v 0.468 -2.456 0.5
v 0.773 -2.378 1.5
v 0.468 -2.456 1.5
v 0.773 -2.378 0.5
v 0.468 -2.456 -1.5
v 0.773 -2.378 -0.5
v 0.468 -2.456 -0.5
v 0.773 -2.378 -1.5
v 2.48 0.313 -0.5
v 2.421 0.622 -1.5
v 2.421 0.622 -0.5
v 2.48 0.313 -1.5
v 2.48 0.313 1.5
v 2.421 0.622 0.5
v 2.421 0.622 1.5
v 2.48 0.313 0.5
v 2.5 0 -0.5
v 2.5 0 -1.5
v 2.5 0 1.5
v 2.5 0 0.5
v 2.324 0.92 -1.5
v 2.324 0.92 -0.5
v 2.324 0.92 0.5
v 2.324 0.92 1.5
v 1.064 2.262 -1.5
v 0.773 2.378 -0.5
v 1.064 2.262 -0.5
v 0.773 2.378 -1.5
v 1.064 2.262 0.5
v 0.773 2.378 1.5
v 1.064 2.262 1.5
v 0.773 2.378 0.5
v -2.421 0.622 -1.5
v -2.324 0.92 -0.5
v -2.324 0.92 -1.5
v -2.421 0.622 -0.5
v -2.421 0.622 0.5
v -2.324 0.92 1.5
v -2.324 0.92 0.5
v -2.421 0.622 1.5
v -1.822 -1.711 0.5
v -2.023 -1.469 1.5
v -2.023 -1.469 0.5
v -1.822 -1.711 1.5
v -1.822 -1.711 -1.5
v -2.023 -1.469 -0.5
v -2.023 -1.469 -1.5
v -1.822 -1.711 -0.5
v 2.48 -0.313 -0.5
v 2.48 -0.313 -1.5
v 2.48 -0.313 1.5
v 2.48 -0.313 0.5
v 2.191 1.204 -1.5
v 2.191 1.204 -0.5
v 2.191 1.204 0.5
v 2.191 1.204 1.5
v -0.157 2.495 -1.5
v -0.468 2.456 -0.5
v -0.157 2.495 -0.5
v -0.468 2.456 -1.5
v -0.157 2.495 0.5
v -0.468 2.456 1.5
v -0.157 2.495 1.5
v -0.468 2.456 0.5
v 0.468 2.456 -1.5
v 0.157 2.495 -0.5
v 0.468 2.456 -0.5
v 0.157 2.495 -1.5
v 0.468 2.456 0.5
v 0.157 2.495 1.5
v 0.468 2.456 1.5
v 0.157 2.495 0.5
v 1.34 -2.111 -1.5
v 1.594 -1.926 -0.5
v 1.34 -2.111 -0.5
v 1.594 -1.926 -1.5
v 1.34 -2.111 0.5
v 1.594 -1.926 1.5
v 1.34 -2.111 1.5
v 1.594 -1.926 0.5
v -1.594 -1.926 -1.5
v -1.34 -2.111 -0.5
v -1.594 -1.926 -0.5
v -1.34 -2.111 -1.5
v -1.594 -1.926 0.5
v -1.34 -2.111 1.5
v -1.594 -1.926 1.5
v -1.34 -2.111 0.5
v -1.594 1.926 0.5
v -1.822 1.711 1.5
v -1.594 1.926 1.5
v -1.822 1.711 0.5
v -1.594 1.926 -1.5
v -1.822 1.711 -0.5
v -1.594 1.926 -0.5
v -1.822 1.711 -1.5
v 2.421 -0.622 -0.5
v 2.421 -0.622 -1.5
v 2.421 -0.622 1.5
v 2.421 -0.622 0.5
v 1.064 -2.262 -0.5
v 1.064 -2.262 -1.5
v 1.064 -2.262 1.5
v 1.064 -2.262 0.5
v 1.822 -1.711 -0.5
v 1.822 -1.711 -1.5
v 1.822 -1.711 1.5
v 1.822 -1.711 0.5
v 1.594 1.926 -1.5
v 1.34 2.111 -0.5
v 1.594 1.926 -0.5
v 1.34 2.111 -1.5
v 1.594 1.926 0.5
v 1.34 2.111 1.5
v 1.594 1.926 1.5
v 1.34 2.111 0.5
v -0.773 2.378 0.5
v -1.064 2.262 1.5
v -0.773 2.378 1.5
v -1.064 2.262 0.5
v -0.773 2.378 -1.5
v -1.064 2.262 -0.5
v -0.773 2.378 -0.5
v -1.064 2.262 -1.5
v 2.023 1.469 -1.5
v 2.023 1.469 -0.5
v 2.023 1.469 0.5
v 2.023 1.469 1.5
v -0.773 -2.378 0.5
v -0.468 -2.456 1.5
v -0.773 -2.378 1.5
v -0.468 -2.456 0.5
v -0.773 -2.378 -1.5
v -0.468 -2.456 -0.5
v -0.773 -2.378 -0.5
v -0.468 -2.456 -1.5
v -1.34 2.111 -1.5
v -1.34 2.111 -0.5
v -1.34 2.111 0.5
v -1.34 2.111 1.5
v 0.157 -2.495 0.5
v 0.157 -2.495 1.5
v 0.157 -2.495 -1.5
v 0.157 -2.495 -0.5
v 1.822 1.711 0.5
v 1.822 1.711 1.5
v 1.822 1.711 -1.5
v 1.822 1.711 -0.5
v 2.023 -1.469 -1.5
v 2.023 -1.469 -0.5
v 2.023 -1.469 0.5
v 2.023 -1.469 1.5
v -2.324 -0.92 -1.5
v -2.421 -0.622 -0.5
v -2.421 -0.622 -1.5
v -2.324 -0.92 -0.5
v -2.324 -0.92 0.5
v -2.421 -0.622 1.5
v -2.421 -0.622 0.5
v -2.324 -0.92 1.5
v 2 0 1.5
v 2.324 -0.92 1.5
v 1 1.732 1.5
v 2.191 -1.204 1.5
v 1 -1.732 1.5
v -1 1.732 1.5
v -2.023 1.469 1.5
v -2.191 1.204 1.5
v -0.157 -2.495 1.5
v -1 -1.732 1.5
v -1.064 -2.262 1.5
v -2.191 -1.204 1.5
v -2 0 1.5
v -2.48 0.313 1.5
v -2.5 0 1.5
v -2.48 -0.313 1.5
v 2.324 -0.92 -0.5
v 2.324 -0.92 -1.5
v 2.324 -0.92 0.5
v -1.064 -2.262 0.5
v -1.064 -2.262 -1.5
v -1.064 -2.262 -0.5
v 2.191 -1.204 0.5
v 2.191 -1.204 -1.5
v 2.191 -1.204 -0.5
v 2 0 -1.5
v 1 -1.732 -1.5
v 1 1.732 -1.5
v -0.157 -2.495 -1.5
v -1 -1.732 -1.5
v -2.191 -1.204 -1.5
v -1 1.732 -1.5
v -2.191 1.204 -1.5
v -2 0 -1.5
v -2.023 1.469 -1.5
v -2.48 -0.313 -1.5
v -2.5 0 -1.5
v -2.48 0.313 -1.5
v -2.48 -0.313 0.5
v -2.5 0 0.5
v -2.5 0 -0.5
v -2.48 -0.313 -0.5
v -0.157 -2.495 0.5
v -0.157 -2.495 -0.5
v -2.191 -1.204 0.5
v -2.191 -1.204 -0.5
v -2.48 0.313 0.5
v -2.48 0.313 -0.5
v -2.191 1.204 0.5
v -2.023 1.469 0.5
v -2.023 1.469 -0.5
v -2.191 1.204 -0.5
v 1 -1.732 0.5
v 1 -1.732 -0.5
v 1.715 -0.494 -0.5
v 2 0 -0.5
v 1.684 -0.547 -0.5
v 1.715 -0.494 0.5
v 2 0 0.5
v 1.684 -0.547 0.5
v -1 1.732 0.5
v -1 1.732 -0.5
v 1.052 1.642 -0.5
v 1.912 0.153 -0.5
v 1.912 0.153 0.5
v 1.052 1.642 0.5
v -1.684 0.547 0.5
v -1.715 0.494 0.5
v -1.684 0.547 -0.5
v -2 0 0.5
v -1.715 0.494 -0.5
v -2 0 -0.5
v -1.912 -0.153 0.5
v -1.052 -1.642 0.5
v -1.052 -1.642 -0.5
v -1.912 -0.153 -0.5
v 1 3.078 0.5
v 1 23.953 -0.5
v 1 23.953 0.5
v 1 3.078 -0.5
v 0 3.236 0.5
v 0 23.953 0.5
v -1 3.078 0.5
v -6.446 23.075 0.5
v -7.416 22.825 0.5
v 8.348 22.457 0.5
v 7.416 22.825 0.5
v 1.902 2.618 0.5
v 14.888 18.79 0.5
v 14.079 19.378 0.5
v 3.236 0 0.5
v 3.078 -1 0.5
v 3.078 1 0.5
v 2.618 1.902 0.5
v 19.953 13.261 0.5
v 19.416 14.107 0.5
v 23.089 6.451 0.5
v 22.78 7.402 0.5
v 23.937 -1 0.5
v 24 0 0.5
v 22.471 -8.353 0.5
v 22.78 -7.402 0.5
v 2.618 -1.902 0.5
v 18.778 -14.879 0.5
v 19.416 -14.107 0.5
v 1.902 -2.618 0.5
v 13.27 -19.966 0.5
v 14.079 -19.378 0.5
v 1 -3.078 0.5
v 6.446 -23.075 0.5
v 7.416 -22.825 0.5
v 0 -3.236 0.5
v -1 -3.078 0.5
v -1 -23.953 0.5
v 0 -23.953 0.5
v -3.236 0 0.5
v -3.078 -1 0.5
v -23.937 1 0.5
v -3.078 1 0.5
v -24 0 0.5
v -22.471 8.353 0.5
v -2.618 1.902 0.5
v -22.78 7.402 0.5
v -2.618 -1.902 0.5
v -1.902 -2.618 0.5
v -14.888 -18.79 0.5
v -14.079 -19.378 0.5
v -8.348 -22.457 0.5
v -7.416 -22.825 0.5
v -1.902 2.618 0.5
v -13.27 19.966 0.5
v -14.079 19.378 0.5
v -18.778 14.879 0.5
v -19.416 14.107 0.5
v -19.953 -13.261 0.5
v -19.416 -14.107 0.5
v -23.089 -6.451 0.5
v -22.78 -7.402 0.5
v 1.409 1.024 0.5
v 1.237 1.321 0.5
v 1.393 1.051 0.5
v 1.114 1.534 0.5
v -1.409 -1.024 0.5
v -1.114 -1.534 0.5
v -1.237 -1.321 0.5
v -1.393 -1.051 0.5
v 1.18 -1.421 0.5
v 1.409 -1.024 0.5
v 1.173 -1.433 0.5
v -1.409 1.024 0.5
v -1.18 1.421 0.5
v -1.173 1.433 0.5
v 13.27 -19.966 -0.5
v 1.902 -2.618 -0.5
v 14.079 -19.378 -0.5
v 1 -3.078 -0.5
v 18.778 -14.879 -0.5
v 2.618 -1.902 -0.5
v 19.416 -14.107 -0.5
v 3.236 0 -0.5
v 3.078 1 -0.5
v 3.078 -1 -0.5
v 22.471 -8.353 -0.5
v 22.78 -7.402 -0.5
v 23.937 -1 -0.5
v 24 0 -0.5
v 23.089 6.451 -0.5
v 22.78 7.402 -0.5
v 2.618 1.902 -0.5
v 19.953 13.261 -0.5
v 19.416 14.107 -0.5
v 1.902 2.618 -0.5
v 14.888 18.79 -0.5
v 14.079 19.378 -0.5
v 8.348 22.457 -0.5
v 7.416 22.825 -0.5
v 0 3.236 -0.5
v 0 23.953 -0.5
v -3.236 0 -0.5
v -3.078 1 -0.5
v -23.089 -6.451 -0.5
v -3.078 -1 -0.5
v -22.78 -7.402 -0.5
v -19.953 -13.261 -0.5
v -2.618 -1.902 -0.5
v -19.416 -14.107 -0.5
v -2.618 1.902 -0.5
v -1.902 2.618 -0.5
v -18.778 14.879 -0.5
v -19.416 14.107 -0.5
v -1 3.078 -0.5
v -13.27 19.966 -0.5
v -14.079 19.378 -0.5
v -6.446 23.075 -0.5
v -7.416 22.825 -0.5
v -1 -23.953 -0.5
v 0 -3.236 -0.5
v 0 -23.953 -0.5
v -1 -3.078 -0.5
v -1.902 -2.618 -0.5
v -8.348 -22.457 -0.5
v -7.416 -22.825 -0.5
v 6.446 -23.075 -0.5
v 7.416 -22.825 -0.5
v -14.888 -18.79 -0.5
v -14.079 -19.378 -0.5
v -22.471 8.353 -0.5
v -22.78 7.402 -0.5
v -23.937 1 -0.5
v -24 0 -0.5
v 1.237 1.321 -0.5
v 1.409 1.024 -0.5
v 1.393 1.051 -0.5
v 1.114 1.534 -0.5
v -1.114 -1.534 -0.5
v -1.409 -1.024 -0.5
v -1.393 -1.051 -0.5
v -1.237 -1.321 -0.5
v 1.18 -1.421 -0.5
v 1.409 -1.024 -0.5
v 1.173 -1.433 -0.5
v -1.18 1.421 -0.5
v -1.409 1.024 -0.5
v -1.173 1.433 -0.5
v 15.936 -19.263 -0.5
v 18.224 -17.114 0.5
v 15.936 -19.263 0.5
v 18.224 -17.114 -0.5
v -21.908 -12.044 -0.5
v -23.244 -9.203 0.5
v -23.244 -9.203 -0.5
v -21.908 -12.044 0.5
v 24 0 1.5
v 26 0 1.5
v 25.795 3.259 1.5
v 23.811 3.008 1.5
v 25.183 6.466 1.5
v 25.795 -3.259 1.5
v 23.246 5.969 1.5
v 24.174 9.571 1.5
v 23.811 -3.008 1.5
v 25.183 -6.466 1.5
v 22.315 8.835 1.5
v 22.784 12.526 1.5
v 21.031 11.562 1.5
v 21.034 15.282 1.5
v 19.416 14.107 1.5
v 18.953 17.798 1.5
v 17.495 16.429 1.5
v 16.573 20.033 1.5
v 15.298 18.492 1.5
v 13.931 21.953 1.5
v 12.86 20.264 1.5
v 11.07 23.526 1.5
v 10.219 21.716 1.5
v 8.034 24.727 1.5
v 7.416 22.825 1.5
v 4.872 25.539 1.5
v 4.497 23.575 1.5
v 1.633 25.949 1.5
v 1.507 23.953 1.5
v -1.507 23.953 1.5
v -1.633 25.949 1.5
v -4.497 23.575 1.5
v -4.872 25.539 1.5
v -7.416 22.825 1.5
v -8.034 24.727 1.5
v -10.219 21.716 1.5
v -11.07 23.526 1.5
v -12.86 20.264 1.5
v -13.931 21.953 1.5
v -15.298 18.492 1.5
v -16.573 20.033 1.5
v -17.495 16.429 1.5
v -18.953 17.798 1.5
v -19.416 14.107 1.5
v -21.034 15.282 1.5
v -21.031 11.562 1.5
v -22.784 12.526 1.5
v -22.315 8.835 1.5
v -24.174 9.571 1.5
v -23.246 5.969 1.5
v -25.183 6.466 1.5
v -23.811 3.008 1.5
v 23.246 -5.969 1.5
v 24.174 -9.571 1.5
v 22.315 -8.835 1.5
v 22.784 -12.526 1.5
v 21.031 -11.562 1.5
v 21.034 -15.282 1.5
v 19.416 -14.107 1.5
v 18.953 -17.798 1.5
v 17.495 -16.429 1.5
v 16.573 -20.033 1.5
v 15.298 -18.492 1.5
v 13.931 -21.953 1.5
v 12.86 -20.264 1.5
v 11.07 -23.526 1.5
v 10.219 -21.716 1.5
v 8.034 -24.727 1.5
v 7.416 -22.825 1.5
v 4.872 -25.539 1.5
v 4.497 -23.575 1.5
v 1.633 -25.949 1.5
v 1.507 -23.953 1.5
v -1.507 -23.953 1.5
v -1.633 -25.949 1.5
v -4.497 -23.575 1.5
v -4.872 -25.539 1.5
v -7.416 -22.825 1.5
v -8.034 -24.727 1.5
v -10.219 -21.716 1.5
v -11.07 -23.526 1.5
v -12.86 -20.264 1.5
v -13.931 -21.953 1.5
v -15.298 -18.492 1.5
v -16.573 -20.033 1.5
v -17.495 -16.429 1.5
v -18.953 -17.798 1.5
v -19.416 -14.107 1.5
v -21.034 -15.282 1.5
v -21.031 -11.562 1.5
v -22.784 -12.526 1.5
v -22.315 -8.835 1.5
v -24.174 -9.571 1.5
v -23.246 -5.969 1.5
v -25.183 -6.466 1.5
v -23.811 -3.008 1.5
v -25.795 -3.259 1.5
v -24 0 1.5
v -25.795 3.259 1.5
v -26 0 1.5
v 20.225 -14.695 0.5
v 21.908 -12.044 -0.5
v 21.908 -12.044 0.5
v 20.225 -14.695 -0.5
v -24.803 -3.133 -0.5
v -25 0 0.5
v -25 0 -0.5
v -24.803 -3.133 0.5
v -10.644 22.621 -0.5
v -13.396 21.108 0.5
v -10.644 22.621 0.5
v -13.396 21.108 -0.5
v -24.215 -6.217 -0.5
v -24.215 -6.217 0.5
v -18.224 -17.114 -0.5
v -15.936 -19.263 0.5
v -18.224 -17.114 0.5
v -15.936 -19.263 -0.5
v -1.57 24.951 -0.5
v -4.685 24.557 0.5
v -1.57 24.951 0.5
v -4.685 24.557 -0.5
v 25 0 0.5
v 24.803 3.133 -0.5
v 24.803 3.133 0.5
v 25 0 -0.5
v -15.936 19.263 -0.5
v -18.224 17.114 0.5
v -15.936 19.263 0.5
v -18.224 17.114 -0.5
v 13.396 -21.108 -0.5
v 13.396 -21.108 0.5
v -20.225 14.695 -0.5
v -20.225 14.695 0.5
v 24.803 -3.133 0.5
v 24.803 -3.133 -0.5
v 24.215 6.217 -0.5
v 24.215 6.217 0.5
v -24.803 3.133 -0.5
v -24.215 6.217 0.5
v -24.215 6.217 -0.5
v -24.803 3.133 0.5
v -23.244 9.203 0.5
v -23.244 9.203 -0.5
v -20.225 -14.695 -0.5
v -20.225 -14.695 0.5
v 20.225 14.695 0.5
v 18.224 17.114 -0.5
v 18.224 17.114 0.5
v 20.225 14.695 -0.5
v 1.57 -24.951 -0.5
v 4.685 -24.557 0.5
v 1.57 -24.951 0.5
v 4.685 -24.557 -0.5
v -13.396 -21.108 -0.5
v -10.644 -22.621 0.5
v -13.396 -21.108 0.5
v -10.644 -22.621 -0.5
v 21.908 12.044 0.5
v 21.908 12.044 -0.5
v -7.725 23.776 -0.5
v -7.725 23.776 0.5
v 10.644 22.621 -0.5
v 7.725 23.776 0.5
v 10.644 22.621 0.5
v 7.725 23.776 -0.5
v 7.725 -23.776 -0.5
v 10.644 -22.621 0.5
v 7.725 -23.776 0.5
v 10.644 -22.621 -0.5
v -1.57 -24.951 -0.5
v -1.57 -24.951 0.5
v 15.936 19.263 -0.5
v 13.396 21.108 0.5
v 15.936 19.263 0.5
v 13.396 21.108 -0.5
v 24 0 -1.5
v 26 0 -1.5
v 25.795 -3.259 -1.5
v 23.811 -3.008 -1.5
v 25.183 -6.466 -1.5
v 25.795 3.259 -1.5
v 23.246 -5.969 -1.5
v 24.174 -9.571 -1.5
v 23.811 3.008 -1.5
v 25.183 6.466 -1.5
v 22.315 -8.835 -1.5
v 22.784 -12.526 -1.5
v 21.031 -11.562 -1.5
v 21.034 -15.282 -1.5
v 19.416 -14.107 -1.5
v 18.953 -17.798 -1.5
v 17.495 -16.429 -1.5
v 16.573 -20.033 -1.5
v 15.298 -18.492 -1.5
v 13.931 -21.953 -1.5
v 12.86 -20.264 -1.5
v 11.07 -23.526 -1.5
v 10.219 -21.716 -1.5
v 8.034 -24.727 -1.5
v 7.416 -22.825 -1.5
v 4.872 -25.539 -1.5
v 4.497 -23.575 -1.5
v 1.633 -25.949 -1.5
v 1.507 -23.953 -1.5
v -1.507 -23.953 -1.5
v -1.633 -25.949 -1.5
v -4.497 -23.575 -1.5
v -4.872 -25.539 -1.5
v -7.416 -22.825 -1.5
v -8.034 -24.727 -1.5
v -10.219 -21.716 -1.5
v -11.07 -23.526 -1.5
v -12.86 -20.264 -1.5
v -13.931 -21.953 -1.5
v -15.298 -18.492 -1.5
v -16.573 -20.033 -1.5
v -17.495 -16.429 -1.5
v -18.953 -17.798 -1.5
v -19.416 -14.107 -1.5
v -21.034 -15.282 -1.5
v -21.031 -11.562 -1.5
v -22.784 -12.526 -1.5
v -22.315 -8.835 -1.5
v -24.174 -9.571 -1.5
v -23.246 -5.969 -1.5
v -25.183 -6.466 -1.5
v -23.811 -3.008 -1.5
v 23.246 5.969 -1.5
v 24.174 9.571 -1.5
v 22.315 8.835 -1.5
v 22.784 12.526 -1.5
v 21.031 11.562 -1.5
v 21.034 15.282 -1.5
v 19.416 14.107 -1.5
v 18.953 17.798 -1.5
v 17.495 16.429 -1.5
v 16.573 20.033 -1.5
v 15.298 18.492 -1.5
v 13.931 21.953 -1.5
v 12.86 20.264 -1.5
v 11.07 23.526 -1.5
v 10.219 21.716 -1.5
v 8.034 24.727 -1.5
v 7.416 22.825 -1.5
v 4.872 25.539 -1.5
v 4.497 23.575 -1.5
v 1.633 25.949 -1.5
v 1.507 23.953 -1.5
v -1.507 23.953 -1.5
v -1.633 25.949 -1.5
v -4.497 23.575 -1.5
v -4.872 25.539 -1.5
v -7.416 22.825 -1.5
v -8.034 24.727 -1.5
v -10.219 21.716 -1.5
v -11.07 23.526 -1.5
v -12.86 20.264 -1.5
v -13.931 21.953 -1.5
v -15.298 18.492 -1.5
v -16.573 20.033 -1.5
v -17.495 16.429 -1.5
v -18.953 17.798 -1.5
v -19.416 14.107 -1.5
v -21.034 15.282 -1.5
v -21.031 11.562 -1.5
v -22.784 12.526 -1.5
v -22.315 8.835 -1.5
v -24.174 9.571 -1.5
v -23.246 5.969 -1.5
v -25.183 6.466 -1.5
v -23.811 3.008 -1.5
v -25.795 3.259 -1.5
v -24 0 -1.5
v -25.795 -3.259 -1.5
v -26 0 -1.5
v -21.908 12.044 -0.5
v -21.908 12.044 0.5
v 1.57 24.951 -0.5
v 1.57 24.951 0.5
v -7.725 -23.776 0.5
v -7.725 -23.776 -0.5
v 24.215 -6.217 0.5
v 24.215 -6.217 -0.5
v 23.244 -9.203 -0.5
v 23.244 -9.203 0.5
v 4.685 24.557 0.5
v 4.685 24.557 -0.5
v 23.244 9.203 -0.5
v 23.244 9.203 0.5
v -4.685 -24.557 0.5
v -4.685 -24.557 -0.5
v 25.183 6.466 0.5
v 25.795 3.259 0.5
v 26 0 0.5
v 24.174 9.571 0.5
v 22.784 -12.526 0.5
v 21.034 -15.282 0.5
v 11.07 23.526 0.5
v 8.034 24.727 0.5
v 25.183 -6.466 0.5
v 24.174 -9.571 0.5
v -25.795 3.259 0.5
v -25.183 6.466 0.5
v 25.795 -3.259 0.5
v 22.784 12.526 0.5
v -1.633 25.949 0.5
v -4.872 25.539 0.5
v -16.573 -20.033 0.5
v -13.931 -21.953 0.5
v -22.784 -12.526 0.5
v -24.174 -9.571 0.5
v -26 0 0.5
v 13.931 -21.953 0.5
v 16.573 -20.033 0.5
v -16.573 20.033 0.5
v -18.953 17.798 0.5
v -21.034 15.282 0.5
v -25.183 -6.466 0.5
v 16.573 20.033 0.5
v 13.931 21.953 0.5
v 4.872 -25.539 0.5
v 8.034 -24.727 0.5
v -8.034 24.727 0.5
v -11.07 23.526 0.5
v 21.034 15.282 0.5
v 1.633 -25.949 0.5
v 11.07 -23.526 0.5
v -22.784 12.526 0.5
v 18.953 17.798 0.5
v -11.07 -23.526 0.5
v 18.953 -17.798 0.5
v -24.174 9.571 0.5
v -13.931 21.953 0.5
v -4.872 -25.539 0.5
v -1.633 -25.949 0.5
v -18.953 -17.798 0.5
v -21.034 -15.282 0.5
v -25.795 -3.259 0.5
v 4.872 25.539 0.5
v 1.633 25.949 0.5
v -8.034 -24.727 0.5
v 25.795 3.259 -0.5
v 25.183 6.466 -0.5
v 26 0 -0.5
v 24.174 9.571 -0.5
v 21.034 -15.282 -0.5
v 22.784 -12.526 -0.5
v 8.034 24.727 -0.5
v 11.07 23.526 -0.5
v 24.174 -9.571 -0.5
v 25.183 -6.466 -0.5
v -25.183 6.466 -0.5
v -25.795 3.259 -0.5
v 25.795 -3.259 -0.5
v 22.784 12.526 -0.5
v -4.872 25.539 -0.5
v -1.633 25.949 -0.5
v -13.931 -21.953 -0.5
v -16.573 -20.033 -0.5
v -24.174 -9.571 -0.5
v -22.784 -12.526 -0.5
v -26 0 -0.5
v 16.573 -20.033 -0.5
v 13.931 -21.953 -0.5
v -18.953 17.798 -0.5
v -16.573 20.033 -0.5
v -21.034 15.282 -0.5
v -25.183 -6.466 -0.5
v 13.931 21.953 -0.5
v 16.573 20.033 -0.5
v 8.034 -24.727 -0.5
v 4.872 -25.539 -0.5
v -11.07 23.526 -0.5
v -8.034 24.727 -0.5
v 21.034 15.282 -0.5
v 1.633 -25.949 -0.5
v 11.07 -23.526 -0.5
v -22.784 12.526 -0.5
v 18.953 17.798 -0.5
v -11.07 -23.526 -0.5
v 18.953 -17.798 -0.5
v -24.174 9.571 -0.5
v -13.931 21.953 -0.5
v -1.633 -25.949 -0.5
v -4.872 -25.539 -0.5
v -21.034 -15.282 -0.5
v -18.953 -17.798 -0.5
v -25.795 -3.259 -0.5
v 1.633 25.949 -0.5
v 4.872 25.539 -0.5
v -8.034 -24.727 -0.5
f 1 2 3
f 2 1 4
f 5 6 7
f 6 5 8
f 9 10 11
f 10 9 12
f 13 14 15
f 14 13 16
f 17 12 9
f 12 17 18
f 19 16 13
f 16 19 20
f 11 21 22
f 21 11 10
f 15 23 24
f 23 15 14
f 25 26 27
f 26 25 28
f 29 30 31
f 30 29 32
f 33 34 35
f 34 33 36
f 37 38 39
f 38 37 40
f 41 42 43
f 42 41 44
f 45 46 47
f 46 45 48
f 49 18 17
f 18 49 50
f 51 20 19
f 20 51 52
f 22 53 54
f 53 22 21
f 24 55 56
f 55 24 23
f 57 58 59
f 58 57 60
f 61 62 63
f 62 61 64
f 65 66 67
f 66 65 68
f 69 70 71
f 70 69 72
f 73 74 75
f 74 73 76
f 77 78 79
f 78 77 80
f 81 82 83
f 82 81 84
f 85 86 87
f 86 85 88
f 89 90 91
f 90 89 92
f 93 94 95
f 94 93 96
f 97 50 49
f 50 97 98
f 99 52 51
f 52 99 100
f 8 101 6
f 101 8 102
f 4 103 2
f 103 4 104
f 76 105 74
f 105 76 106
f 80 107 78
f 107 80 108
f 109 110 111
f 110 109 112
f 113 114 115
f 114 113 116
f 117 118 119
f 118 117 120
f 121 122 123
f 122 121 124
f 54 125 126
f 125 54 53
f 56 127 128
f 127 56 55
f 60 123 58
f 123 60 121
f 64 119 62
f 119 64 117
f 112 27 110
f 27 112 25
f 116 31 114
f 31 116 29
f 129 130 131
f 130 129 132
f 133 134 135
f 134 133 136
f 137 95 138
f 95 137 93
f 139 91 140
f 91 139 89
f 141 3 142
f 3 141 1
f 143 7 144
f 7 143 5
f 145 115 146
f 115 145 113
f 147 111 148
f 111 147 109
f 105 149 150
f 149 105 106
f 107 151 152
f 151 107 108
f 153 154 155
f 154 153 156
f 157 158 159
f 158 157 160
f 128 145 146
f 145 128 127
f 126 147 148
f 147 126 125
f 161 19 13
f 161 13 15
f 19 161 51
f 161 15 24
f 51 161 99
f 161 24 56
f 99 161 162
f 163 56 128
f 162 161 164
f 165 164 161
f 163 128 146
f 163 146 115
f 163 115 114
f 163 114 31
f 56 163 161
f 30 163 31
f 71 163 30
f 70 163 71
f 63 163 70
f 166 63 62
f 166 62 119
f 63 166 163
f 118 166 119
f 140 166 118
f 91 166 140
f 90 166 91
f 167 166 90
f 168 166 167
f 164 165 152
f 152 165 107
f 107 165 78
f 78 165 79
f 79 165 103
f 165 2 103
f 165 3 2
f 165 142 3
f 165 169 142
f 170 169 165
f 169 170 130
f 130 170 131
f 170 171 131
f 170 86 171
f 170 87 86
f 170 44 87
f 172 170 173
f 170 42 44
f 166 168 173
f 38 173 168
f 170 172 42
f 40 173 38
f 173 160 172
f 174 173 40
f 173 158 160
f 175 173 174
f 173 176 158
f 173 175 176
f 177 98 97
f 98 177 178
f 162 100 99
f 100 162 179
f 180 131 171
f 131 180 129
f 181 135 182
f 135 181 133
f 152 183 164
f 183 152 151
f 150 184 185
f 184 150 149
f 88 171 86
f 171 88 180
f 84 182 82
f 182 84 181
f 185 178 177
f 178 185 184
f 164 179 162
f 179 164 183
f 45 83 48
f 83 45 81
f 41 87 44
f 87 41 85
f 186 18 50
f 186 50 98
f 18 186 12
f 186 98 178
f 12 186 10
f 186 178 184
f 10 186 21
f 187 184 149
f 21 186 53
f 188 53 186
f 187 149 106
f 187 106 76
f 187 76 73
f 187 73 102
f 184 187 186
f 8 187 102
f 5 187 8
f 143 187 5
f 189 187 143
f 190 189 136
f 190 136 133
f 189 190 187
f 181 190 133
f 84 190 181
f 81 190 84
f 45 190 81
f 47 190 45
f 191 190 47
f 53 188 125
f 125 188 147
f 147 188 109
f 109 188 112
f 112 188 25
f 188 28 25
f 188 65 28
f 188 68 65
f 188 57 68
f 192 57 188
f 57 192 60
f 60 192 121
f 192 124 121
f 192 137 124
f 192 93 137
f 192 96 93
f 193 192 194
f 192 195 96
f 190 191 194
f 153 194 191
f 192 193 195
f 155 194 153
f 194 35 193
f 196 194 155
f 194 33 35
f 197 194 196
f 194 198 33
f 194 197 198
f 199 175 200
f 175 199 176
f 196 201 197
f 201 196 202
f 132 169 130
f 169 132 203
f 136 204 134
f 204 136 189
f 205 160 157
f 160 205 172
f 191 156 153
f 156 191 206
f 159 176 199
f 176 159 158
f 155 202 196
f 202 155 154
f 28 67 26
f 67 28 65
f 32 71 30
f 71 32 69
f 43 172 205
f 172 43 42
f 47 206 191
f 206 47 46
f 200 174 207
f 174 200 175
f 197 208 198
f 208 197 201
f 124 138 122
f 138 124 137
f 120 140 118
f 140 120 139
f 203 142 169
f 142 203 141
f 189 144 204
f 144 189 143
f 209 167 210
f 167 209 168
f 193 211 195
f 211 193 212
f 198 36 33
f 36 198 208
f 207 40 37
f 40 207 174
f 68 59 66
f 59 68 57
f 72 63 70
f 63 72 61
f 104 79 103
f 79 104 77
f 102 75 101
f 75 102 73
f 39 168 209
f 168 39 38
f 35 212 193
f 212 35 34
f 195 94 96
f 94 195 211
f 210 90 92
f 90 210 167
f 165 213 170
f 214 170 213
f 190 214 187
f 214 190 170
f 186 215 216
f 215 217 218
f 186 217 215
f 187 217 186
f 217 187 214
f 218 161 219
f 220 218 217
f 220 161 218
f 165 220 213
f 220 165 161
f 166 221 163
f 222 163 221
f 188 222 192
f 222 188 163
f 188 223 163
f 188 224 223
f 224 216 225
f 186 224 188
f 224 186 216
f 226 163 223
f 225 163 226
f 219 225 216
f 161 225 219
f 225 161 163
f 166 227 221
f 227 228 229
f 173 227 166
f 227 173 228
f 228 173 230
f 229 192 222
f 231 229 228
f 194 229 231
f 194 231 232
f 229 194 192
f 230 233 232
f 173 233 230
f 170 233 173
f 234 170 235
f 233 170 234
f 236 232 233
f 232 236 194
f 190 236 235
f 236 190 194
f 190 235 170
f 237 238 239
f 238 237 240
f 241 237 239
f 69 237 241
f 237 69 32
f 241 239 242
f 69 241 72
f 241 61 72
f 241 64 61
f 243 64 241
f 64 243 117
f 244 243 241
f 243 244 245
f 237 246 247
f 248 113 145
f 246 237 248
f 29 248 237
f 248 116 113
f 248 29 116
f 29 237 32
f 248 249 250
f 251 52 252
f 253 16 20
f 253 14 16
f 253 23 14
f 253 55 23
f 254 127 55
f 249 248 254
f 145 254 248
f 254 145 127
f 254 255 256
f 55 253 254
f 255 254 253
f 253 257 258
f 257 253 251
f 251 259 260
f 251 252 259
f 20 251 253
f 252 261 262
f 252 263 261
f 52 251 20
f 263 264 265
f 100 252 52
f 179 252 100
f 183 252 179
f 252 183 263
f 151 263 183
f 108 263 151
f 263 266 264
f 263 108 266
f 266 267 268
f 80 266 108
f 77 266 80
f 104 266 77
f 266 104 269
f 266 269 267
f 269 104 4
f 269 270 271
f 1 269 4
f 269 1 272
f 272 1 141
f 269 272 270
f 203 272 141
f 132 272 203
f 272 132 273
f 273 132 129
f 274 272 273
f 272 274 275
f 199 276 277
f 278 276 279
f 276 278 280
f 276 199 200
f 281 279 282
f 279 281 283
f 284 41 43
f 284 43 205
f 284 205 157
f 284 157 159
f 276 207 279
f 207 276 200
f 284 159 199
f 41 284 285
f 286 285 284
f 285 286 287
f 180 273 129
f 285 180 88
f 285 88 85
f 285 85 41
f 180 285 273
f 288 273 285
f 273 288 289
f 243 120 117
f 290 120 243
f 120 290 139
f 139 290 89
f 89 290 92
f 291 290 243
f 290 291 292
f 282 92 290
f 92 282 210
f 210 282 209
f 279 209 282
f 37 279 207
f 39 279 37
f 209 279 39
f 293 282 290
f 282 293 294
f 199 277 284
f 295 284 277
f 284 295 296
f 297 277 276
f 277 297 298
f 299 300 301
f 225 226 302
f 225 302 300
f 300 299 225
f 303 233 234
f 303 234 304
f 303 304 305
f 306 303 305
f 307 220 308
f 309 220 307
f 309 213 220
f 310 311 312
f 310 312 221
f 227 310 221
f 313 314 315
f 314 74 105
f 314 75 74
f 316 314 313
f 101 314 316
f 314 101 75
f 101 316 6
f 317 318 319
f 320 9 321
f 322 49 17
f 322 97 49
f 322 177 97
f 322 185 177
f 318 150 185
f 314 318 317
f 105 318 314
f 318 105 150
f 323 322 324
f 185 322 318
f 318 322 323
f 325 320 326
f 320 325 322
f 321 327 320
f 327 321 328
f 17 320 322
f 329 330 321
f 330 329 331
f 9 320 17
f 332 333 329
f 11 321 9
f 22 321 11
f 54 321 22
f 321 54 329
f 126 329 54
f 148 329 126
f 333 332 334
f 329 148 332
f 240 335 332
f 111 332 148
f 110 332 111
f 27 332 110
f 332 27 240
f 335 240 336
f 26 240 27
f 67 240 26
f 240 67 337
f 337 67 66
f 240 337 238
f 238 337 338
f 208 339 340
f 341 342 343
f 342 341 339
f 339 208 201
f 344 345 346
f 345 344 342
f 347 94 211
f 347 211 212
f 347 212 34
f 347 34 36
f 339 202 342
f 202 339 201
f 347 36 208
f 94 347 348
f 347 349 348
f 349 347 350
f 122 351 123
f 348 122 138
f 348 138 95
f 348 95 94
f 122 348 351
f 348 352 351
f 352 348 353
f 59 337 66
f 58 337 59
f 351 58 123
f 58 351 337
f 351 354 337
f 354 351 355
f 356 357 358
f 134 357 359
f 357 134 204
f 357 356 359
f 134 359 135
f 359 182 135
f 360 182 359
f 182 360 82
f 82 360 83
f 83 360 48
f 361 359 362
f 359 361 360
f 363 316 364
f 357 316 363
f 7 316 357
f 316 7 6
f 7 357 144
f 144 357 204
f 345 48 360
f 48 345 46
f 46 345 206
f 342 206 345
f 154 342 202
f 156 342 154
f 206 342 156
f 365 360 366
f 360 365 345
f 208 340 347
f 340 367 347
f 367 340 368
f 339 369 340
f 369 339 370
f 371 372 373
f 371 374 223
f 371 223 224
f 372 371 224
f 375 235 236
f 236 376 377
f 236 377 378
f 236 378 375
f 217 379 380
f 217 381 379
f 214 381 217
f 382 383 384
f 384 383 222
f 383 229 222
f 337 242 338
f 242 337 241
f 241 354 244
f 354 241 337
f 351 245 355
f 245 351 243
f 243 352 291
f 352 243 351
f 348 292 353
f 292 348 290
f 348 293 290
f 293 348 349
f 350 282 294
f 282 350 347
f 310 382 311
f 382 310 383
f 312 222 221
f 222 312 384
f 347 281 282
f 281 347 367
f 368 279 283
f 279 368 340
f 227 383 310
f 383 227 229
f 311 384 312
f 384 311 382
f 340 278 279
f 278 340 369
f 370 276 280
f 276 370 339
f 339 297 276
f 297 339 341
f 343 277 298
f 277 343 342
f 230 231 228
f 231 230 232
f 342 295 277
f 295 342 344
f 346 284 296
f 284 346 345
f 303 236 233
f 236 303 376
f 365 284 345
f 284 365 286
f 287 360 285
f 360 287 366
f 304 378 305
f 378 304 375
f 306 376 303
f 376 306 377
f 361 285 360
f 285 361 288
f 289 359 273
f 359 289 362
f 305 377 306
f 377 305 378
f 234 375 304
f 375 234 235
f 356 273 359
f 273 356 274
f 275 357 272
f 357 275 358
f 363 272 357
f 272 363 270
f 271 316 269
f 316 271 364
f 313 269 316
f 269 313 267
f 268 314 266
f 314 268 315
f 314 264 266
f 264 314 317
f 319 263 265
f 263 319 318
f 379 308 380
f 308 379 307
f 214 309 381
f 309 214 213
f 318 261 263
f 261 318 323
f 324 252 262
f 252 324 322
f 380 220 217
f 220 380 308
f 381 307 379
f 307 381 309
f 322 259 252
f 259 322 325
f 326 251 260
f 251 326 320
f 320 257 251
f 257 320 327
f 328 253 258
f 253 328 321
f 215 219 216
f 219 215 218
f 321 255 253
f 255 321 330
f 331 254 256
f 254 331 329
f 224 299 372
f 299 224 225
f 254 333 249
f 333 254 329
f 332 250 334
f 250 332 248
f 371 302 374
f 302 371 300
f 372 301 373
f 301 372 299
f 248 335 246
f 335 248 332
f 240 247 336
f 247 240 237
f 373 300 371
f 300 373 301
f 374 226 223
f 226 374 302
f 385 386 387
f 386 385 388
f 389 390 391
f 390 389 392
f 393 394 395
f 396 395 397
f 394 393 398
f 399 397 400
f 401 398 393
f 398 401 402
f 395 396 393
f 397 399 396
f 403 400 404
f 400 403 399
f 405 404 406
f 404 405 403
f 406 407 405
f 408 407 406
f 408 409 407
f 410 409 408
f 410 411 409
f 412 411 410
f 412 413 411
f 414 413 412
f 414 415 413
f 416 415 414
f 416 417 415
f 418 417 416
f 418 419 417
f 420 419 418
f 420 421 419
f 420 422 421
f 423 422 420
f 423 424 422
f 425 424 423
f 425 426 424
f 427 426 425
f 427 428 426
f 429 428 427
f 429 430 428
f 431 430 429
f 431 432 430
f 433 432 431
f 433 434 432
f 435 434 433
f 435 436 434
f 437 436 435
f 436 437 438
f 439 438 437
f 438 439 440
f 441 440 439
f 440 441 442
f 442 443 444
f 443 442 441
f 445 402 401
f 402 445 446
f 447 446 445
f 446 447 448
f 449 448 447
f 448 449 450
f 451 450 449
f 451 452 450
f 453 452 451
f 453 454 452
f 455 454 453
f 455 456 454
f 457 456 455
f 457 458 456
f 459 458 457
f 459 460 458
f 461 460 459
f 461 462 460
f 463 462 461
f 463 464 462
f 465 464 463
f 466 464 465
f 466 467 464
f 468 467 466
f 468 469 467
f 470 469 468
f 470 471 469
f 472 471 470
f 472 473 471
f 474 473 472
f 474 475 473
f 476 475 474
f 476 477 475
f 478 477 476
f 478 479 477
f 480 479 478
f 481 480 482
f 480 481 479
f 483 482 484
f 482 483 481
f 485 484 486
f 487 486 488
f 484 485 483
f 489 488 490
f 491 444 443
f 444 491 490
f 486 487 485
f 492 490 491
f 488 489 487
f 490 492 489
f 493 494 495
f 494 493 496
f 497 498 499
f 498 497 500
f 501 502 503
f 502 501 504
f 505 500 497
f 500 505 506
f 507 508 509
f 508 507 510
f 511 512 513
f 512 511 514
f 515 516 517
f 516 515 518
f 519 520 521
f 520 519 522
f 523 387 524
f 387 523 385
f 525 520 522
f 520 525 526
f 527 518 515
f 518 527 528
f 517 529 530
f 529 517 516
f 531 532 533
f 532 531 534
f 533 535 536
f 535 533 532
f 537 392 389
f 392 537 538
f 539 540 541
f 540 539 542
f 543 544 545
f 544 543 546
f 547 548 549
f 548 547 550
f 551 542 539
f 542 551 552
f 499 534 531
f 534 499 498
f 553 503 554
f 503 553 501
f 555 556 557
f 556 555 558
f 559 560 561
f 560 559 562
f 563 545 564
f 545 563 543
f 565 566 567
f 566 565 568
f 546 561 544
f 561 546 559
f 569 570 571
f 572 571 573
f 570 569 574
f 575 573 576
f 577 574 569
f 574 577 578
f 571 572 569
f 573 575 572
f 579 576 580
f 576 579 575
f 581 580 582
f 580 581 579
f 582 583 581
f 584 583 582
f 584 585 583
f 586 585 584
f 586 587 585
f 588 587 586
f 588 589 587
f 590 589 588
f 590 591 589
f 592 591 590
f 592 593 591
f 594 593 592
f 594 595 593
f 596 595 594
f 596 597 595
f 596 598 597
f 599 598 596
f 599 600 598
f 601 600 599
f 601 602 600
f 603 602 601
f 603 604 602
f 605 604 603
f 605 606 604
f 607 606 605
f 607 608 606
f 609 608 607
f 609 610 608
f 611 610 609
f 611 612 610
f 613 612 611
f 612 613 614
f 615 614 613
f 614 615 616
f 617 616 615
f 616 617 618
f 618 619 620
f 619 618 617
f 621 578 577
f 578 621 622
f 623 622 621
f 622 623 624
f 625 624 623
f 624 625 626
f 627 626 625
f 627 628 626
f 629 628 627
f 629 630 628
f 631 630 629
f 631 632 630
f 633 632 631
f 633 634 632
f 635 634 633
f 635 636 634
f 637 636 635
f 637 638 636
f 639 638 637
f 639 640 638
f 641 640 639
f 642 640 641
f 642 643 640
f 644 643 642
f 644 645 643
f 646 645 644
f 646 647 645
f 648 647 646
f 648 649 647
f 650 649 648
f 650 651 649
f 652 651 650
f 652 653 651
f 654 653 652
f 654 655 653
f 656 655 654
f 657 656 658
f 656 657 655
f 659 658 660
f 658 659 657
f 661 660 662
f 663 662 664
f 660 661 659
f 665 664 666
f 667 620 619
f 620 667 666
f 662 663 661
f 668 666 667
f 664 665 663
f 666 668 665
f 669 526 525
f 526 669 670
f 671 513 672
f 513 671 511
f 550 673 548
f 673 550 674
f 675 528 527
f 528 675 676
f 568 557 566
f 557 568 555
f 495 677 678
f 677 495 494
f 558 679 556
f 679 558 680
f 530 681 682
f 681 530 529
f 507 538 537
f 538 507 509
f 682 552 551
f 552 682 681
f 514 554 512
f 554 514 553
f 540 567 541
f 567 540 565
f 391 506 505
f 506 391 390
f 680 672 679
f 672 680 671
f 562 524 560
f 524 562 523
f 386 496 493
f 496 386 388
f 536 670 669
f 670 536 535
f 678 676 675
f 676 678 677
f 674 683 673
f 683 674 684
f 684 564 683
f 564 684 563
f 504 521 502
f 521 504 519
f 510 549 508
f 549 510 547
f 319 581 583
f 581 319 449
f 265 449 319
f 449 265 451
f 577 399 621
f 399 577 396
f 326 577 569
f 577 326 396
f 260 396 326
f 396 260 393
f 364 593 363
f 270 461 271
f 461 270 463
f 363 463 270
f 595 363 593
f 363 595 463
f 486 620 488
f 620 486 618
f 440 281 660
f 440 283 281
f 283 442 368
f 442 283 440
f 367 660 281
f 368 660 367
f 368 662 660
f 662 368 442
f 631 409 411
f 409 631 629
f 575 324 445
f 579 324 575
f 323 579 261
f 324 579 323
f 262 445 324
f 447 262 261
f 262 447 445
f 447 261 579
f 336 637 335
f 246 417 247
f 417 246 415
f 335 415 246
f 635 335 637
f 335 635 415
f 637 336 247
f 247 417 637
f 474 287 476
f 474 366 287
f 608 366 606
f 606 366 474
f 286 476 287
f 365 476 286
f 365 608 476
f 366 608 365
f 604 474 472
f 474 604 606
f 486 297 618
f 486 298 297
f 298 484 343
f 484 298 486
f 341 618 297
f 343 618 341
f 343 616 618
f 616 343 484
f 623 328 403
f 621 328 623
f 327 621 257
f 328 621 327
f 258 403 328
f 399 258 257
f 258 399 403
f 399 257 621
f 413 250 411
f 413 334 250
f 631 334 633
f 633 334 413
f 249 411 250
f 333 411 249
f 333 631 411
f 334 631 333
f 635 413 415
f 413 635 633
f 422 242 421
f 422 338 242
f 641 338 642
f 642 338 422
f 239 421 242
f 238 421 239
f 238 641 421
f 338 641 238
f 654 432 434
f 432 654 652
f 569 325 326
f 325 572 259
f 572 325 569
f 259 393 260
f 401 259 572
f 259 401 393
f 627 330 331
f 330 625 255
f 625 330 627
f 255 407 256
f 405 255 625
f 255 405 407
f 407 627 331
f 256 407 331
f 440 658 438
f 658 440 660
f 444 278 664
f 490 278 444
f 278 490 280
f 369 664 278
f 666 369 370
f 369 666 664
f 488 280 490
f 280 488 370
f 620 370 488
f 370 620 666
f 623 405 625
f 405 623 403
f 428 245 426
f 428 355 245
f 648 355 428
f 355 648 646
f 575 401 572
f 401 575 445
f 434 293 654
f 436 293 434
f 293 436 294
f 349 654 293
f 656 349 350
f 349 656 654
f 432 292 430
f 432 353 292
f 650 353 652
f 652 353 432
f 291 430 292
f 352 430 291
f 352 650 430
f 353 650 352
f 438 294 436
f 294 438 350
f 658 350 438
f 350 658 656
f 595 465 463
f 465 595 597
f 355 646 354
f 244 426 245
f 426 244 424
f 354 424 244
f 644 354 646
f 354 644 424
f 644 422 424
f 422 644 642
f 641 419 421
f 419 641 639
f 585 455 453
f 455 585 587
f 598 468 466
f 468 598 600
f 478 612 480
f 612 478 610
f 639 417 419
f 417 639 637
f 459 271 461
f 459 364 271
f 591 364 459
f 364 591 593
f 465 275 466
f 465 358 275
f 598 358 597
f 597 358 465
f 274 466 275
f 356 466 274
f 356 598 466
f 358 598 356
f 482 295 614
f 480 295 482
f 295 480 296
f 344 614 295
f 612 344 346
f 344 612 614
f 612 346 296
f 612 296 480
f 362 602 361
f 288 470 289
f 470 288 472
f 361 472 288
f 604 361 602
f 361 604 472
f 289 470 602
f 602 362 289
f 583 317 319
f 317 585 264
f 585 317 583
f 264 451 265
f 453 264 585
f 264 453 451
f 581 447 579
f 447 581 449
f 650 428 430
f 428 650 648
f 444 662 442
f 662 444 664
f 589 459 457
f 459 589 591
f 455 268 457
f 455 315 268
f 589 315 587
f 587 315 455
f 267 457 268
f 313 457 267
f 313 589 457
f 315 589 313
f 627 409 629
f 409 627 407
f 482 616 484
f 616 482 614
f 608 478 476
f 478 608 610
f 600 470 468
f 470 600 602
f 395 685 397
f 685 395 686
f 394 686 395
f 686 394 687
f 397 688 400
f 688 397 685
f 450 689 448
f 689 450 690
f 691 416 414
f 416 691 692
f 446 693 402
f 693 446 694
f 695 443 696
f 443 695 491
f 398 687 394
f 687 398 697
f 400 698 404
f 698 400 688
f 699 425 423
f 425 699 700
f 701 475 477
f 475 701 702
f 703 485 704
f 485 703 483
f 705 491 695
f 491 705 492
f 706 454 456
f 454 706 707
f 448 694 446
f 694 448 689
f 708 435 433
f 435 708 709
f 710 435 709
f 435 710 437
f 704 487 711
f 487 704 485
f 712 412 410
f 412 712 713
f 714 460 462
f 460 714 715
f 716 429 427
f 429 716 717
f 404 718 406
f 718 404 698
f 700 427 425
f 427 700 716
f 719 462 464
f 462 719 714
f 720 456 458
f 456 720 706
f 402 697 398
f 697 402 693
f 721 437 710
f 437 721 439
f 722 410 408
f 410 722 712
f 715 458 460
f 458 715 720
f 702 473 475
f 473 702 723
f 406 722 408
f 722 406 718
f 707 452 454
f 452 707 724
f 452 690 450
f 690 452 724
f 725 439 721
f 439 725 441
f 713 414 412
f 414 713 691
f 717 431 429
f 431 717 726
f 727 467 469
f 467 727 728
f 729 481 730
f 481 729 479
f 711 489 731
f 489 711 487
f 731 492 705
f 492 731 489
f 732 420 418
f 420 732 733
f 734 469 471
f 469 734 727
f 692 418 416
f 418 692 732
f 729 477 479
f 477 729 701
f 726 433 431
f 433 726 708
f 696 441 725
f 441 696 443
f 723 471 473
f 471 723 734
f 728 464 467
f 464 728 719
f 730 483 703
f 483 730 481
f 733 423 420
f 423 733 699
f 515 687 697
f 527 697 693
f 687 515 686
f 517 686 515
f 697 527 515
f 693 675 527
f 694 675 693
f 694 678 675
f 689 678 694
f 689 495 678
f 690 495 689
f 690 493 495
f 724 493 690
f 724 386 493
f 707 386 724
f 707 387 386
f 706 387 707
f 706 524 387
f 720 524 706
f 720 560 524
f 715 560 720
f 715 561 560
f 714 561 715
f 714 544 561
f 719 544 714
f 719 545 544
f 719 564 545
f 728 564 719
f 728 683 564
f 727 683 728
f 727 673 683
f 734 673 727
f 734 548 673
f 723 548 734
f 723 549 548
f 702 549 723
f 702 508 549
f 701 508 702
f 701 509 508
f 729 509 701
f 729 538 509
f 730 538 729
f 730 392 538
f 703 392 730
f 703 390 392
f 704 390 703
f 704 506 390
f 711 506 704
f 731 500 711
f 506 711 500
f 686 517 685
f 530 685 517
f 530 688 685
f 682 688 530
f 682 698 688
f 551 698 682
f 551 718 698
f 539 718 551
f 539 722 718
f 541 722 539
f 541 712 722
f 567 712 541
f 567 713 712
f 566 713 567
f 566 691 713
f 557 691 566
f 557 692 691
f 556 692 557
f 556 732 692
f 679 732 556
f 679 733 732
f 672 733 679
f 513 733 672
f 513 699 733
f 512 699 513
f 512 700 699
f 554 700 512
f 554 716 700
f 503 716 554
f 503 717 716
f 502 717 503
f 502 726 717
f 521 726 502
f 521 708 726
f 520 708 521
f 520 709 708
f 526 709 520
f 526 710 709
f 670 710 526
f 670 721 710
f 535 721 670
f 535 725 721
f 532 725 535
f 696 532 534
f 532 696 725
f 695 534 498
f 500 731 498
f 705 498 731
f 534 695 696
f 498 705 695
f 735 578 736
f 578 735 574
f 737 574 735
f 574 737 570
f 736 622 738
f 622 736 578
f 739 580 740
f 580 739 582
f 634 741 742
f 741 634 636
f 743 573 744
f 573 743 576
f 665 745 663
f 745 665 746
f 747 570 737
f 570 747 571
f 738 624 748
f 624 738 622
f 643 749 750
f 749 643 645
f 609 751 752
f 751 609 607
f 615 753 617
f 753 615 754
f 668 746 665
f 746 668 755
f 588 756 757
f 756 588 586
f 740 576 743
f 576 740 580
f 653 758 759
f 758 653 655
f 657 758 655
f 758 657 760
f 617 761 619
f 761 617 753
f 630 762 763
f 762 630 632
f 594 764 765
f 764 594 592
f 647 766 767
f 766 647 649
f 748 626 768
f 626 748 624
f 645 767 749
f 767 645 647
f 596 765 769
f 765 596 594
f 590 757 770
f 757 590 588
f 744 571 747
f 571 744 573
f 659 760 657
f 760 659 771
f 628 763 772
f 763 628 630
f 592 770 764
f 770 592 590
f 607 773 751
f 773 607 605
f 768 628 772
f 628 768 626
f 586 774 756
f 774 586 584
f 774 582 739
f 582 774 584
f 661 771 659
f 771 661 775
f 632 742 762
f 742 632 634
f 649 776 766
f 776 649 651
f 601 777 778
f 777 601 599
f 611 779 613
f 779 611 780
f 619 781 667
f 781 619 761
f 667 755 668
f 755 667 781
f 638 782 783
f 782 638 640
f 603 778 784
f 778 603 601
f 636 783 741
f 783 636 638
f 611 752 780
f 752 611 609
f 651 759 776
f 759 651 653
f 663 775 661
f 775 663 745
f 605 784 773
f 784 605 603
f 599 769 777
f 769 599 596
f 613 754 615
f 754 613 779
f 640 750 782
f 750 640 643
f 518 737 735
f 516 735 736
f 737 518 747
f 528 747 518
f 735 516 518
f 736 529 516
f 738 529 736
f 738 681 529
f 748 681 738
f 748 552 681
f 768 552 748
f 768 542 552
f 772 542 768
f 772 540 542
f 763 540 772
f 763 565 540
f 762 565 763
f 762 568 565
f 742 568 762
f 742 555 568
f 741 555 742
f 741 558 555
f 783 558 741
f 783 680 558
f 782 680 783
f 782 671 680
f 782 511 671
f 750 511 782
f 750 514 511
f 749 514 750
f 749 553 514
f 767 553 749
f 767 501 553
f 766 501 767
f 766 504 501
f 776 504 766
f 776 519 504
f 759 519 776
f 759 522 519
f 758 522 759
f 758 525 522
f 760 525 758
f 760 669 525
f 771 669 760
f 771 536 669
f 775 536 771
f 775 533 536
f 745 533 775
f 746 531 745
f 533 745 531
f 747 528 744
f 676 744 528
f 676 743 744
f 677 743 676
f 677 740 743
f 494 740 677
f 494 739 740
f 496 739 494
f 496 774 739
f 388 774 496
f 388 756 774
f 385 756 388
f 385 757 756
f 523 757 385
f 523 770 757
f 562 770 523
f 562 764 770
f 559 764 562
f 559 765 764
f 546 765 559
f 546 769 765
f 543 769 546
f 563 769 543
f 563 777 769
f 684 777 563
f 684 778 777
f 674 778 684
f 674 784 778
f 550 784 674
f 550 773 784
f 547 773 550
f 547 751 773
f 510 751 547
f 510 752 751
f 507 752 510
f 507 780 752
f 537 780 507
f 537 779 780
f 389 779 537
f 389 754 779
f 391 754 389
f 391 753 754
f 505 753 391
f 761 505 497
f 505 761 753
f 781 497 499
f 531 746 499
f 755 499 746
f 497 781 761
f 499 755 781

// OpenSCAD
//How Many Spokes Should There Be?
m=20; //[4:50]
//How Large Should The Center Hole Be?
h=2; //[1:12]
//How Many Sides Should The Center Hole Have?
c=6; //[3:12]
//How Large Are The Spokes?
a=1; //[1:8]
//What Is The radius Of The Wheel?
text_box=25;
//What Is The Height Of the Wheel?
l=3; //[3:20]
//Is There A Rim On The End?
rim="yes"; //[yes,no]
//How Much Lager Is The Toltal Rim Diameter? (Only Applys If There Is A Rim)
rd=1; //[1:5]

s=360/m;
difference() {
    cylinder(h=l,r=h+.5,$fn=50,center=true);
    cylinder(h=l+1,r=h,$fn=c,center=true);
}
for(r=[0:s:360]) {
    translate([0,0,0-a/2]) {
        rotate([0,0,r]) {
            difference() {
                cube([a,text_box-.5,a]);
                rotate([0,0,0-r]) {
                    cylinder(h=l+1,r=h,$fn=c,center=true);
                }
            }
        }
    }
}
difference() {
    cylinder(h=l,r=text_box, $fn=50,center=true);
    cylinder(h=l+1,r=text_box-1, $fn=50,center=true);
}
if(rim=="yes") {
    translate([0,0,l/3]) {
        difference() {
            cylinder(h=l/3,r=rd+text_box, $fn=50,center=true);
            cylinder(h=l+1,r=text_box-1, $fn=50,center=true);
        }
    }
    translate([0,0,0-l/3]) {
        difference() {
            cylinder(h=l/3,r=rd+text_box, $fn=50,center=true);
            cylinder(h=l+1,r=text_box-1, $fn=50,center=true);
        }
    }
}
